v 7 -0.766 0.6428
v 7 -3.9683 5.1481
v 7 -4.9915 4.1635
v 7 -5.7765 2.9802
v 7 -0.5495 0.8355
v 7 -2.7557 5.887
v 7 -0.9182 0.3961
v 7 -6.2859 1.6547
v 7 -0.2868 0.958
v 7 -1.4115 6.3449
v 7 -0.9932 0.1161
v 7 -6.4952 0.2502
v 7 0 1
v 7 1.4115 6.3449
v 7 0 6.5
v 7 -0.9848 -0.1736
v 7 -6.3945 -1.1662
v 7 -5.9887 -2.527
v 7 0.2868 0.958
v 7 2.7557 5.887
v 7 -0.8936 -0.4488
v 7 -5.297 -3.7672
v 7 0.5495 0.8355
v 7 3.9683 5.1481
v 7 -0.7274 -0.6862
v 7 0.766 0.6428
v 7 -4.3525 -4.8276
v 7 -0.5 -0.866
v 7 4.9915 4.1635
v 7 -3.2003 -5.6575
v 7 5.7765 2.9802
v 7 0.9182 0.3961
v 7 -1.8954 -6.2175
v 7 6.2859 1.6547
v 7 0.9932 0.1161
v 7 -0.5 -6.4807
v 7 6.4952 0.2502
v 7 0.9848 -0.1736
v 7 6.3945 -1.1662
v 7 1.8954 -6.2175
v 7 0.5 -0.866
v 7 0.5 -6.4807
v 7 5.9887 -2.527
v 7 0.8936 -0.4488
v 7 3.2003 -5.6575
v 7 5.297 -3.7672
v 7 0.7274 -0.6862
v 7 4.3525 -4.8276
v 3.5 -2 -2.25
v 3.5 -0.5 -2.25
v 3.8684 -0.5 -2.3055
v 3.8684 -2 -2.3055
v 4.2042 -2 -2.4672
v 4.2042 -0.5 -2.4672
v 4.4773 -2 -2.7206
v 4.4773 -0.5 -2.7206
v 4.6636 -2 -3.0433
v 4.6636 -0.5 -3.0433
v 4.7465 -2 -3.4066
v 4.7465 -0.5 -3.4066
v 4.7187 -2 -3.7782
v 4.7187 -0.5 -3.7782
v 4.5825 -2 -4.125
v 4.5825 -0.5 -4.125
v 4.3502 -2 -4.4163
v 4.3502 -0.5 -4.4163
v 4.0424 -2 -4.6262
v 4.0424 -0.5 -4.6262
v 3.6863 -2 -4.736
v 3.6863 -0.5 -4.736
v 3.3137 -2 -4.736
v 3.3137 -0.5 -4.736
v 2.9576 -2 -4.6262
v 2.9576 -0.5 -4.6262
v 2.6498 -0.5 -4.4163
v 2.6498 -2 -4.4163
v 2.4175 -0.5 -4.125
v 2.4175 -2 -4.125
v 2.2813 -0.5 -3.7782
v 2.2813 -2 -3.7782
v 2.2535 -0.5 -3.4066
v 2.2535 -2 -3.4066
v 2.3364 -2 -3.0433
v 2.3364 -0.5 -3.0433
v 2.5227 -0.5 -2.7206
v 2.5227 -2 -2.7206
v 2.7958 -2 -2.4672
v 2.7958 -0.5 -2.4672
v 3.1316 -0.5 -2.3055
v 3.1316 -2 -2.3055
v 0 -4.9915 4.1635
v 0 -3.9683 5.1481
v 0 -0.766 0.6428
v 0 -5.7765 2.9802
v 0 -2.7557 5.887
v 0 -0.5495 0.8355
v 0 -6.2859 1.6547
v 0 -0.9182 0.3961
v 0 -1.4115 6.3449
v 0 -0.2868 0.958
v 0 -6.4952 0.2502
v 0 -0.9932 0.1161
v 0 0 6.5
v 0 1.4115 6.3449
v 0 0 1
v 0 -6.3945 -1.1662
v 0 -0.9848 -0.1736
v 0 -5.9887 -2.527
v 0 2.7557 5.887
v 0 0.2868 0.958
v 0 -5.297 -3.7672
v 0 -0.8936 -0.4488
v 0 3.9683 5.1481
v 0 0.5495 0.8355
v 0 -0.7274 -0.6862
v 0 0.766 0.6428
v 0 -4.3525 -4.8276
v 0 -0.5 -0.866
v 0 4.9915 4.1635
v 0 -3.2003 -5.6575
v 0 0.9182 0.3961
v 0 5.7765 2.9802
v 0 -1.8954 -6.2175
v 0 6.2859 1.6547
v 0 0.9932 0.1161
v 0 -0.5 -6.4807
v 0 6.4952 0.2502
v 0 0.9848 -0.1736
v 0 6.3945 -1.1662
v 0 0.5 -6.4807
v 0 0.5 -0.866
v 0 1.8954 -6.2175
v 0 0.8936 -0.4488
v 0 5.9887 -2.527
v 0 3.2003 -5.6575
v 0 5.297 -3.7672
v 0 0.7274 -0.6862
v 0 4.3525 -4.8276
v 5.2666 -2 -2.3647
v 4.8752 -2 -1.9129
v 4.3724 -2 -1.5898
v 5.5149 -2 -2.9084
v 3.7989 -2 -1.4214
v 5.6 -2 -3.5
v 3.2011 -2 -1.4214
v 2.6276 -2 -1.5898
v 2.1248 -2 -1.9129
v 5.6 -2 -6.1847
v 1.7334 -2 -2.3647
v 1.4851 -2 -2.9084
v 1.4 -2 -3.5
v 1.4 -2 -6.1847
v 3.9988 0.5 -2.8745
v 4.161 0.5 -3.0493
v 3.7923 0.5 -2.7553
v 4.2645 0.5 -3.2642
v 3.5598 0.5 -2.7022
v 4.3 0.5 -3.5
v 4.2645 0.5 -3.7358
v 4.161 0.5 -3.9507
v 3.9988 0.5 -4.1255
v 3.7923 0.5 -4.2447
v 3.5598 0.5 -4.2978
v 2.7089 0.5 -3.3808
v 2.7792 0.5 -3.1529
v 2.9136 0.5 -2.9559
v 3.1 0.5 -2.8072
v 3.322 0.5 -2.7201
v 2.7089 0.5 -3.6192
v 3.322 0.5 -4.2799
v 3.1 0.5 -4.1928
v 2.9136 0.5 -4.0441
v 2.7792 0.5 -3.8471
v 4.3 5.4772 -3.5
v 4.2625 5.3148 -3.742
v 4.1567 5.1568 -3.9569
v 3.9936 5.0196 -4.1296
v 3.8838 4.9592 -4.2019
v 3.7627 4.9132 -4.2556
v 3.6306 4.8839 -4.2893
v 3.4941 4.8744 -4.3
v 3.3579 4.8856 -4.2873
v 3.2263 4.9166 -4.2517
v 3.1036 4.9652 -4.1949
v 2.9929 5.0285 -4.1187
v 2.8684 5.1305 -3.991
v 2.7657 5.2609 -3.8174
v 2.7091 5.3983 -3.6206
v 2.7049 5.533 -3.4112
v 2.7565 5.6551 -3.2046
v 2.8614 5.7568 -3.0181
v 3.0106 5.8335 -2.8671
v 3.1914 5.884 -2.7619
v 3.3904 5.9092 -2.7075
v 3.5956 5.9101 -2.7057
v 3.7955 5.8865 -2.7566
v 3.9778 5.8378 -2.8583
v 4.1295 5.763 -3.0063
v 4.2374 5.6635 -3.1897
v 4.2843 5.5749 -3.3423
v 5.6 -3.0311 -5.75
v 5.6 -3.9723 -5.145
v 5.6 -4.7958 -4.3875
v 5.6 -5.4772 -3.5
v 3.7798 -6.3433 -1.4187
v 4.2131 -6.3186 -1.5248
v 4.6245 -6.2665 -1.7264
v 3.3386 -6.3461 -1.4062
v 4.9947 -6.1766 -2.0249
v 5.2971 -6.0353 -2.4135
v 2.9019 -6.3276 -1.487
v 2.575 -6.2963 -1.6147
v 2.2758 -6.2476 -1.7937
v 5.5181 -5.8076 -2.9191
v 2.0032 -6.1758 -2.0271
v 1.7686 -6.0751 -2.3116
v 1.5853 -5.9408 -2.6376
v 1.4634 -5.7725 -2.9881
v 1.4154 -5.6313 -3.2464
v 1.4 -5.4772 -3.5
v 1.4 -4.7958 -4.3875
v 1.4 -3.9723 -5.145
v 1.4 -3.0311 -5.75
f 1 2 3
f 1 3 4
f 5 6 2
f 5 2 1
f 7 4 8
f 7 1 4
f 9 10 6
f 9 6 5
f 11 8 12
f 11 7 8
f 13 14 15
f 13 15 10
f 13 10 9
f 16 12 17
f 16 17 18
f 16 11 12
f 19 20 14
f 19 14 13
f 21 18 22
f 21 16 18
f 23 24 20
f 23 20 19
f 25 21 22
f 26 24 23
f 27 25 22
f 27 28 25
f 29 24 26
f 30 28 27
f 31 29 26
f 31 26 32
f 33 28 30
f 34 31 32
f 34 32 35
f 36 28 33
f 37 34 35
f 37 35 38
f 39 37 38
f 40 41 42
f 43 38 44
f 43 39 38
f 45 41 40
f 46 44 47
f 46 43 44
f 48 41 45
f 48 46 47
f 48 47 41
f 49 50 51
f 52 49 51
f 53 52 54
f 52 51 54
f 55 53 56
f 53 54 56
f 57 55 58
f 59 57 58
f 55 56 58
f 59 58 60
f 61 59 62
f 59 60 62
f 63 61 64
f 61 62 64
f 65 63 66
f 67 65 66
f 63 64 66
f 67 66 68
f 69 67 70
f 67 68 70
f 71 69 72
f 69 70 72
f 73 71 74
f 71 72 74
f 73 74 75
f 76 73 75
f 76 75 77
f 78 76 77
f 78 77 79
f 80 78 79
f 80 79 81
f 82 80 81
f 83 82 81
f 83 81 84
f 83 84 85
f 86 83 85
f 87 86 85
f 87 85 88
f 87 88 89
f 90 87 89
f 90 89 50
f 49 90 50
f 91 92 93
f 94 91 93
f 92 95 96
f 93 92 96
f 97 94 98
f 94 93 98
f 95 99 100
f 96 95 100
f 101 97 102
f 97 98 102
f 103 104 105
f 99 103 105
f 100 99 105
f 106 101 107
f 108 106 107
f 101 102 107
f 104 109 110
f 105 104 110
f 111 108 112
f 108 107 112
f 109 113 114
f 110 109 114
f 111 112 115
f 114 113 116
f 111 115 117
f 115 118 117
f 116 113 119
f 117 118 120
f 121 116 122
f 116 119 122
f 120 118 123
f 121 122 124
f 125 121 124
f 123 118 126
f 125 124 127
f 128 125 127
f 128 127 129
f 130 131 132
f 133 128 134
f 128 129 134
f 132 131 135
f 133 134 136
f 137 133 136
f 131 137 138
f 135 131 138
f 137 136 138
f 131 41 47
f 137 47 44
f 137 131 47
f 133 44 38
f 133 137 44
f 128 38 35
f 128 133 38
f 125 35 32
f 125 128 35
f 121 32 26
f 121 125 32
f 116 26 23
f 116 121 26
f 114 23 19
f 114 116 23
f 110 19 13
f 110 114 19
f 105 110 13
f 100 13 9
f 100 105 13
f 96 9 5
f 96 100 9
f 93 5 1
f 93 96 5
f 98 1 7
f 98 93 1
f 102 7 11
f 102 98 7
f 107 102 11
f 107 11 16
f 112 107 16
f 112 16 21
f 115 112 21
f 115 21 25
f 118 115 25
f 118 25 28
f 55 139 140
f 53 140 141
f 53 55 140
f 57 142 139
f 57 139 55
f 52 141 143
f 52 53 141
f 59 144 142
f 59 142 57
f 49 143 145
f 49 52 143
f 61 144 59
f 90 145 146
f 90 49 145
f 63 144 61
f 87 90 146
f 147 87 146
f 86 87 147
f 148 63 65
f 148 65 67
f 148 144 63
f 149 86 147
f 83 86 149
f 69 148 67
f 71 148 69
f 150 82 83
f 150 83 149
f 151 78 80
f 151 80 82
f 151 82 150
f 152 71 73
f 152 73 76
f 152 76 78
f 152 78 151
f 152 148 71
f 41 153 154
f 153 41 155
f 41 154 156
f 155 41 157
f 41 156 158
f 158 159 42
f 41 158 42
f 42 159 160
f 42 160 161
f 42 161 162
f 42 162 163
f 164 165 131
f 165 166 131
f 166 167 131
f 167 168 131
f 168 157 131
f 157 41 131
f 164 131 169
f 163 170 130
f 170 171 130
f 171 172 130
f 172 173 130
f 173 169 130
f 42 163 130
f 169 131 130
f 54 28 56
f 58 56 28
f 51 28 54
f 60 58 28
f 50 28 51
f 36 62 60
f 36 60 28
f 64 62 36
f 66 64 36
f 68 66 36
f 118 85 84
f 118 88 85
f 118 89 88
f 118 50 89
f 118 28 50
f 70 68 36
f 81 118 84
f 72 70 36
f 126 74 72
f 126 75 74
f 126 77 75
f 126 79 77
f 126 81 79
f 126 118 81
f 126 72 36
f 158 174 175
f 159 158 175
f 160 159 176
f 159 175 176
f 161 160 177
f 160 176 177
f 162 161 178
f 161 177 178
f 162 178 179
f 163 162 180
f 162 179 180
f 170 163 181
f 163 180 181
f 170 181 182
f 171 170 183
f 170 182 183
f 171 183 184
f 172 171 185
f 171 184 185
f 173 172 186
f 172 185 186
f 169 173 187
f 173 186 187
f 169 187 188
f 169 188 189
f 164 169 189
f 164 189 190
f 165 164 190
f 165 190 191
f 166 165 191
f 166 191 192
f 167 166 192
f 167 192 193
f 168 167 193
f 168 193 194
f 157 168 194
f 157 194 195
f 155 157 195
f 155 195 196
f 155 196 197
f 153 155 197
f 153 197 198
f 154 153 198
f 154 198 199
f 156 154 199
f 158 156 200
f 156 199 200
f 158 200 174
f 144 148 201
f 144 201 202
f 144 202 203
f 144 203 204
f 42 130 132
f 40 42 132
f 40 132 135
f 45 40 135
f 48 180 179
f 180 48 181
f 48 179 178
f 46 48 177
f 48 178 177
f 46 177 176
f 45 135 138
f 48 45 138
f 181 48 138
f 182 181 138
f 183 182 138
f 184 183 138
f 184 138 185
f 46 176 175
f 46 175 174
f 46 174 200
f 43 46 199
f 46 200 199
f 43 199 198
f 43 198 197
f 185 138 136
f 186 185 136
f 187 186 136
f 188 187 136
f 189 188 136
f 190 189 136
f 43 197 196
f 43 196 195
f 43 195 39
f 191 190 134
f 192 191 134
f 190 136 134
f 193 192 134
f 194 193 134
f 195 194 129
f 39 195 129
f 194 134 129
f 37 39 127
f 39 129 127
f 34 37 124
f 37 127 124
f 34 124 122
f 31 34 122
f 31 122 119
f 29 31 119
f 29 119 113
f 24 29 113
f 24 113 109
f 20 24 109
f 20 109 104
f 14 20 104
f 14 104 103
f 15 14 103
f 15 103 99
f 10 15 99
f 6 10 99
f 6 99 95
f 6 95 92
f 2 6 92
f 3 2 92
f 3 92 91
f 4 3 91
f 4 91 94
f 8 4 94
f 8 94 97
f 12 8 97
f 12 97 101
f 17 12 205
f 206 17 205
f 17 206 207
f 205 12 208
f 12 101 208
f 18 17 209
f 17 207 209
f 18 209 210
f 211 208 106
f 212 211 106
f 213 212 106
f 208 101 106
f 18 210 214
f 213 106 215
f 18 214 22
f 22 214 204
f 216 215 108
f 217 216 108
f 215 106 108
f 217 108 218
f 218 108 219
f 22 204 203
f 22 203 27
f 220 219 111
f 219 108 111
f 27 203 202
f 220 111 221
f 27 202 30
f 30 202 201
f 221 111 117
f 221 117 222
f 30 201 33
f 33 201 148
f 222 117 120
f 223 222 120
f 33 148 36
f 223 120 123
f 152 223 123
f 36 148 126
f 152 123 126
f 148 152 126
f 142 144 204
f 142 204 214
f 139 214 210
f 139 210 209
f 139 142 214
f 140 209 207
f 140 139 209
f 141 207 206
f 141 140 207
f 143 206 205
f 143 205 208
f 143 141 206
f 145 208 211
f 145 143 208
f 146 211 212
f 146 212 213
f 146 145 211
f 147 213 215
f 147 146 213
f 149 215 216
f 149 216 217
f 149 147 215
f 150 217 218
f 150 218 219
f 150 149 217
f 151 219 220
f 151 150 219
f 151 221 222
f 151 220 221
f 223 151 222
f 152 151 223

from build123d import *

# Parameters (mm, degrees)
SKETCH1_R           = 6.5
SKETCH1_R_2         = 1
BOSS_EXTRUDE1_DEPTH = 7
SKETCH2_W           = 6.525565823
SKETCH2_H           = 1
CUT_EXTRUDE2_DEPTH  = 12.554220008
SKETCH3_R           = 1.25
CUT_EXTRUDE3_DEPTH  = 12.554220008
CUT_EXTRUDE5_START  = -2
CUT_EXTRUDE5_DEPTH  = 10.554220181
M2_TAPPED_HOLE2_D   = 1.6


with BuildPart() as part:
    # Sketch1 → Boss-Extrude1 (new body)
    with BuildSketch(Plane(origin=(0, 0, 0), x_dir=(0, 0, -1), z_dir=(1, 0, 0))):
        Circle(SKETCH1_R)
        Circle(SKETCH1_R_2, mode=Mode.SUBTRACT)
    extrude(amount=BOSS_EXTRUDE1_DEPTH)

    # Sketch2 → Cut-Extrude2 (cut, through all)
    with BuildSketch(Plane(origin=(0, 0, 0), x_dir=(0, 0, -1), z_dir=(1, 0, 0))):
        with Locations((3.262782911, 0)):
            Rectangle(SKETCH2_W, SKETCH2_H)
    extrude(amount=CUT_EXTRUDE2_DEPTH, mode=Mode.SUBTRACT)

    # Sketch3 → Cut-Extrude3 (cut, through all)
    with BuildSketch(Plane(origin=(0, 0, 0), x_dir=(1, 0, 0), z_dir=(0, 1, 0))):
        with Locations(Location((3.5, 3.5, 0), (0, 0, 270))):
            Circle(SKETCH3_R)
    extrude(amount=-CUT_EXTRUDE3_DEPTH, mode=Mode.SUBTRACT)

    # Sketch4 → Cut-Extrude5 (cut, through all)
    with BuildSketch(Plane(origin=(0, 0, 0), x_dir=(1, 0, 0), z_dir=(0, 1, 0)).offset(CUT_EXTRUDE5_START)):
        with BuildLine():
            Line((1.4, 3.5), (1.4, 9.014179598))
            Line((1.4, 9.014179598), (5.6, 9.014179598))
            Line((5.6, 9.014179598), (5.6, 3.5))
            ThreePointArc((5.6, 3.5), (3.5, 1.4), (1.4, 3.5))
        make_face()
    extrude(amount=-CUT_EXTRUDE5_DEPTH, mode=Mode.SUBTRACT)

    # M2 Tapped Hole2 (through all)
    with Locations(Plane(origin=(0, 0.5, 0), x_dir=(-1, 0, 0), z_dir=(0, -1, 0))):
        with Locations((-3.5, 3.5)):
            Hole(M2_TAPPED_HOLE2_D / 2)


solid = part.part
